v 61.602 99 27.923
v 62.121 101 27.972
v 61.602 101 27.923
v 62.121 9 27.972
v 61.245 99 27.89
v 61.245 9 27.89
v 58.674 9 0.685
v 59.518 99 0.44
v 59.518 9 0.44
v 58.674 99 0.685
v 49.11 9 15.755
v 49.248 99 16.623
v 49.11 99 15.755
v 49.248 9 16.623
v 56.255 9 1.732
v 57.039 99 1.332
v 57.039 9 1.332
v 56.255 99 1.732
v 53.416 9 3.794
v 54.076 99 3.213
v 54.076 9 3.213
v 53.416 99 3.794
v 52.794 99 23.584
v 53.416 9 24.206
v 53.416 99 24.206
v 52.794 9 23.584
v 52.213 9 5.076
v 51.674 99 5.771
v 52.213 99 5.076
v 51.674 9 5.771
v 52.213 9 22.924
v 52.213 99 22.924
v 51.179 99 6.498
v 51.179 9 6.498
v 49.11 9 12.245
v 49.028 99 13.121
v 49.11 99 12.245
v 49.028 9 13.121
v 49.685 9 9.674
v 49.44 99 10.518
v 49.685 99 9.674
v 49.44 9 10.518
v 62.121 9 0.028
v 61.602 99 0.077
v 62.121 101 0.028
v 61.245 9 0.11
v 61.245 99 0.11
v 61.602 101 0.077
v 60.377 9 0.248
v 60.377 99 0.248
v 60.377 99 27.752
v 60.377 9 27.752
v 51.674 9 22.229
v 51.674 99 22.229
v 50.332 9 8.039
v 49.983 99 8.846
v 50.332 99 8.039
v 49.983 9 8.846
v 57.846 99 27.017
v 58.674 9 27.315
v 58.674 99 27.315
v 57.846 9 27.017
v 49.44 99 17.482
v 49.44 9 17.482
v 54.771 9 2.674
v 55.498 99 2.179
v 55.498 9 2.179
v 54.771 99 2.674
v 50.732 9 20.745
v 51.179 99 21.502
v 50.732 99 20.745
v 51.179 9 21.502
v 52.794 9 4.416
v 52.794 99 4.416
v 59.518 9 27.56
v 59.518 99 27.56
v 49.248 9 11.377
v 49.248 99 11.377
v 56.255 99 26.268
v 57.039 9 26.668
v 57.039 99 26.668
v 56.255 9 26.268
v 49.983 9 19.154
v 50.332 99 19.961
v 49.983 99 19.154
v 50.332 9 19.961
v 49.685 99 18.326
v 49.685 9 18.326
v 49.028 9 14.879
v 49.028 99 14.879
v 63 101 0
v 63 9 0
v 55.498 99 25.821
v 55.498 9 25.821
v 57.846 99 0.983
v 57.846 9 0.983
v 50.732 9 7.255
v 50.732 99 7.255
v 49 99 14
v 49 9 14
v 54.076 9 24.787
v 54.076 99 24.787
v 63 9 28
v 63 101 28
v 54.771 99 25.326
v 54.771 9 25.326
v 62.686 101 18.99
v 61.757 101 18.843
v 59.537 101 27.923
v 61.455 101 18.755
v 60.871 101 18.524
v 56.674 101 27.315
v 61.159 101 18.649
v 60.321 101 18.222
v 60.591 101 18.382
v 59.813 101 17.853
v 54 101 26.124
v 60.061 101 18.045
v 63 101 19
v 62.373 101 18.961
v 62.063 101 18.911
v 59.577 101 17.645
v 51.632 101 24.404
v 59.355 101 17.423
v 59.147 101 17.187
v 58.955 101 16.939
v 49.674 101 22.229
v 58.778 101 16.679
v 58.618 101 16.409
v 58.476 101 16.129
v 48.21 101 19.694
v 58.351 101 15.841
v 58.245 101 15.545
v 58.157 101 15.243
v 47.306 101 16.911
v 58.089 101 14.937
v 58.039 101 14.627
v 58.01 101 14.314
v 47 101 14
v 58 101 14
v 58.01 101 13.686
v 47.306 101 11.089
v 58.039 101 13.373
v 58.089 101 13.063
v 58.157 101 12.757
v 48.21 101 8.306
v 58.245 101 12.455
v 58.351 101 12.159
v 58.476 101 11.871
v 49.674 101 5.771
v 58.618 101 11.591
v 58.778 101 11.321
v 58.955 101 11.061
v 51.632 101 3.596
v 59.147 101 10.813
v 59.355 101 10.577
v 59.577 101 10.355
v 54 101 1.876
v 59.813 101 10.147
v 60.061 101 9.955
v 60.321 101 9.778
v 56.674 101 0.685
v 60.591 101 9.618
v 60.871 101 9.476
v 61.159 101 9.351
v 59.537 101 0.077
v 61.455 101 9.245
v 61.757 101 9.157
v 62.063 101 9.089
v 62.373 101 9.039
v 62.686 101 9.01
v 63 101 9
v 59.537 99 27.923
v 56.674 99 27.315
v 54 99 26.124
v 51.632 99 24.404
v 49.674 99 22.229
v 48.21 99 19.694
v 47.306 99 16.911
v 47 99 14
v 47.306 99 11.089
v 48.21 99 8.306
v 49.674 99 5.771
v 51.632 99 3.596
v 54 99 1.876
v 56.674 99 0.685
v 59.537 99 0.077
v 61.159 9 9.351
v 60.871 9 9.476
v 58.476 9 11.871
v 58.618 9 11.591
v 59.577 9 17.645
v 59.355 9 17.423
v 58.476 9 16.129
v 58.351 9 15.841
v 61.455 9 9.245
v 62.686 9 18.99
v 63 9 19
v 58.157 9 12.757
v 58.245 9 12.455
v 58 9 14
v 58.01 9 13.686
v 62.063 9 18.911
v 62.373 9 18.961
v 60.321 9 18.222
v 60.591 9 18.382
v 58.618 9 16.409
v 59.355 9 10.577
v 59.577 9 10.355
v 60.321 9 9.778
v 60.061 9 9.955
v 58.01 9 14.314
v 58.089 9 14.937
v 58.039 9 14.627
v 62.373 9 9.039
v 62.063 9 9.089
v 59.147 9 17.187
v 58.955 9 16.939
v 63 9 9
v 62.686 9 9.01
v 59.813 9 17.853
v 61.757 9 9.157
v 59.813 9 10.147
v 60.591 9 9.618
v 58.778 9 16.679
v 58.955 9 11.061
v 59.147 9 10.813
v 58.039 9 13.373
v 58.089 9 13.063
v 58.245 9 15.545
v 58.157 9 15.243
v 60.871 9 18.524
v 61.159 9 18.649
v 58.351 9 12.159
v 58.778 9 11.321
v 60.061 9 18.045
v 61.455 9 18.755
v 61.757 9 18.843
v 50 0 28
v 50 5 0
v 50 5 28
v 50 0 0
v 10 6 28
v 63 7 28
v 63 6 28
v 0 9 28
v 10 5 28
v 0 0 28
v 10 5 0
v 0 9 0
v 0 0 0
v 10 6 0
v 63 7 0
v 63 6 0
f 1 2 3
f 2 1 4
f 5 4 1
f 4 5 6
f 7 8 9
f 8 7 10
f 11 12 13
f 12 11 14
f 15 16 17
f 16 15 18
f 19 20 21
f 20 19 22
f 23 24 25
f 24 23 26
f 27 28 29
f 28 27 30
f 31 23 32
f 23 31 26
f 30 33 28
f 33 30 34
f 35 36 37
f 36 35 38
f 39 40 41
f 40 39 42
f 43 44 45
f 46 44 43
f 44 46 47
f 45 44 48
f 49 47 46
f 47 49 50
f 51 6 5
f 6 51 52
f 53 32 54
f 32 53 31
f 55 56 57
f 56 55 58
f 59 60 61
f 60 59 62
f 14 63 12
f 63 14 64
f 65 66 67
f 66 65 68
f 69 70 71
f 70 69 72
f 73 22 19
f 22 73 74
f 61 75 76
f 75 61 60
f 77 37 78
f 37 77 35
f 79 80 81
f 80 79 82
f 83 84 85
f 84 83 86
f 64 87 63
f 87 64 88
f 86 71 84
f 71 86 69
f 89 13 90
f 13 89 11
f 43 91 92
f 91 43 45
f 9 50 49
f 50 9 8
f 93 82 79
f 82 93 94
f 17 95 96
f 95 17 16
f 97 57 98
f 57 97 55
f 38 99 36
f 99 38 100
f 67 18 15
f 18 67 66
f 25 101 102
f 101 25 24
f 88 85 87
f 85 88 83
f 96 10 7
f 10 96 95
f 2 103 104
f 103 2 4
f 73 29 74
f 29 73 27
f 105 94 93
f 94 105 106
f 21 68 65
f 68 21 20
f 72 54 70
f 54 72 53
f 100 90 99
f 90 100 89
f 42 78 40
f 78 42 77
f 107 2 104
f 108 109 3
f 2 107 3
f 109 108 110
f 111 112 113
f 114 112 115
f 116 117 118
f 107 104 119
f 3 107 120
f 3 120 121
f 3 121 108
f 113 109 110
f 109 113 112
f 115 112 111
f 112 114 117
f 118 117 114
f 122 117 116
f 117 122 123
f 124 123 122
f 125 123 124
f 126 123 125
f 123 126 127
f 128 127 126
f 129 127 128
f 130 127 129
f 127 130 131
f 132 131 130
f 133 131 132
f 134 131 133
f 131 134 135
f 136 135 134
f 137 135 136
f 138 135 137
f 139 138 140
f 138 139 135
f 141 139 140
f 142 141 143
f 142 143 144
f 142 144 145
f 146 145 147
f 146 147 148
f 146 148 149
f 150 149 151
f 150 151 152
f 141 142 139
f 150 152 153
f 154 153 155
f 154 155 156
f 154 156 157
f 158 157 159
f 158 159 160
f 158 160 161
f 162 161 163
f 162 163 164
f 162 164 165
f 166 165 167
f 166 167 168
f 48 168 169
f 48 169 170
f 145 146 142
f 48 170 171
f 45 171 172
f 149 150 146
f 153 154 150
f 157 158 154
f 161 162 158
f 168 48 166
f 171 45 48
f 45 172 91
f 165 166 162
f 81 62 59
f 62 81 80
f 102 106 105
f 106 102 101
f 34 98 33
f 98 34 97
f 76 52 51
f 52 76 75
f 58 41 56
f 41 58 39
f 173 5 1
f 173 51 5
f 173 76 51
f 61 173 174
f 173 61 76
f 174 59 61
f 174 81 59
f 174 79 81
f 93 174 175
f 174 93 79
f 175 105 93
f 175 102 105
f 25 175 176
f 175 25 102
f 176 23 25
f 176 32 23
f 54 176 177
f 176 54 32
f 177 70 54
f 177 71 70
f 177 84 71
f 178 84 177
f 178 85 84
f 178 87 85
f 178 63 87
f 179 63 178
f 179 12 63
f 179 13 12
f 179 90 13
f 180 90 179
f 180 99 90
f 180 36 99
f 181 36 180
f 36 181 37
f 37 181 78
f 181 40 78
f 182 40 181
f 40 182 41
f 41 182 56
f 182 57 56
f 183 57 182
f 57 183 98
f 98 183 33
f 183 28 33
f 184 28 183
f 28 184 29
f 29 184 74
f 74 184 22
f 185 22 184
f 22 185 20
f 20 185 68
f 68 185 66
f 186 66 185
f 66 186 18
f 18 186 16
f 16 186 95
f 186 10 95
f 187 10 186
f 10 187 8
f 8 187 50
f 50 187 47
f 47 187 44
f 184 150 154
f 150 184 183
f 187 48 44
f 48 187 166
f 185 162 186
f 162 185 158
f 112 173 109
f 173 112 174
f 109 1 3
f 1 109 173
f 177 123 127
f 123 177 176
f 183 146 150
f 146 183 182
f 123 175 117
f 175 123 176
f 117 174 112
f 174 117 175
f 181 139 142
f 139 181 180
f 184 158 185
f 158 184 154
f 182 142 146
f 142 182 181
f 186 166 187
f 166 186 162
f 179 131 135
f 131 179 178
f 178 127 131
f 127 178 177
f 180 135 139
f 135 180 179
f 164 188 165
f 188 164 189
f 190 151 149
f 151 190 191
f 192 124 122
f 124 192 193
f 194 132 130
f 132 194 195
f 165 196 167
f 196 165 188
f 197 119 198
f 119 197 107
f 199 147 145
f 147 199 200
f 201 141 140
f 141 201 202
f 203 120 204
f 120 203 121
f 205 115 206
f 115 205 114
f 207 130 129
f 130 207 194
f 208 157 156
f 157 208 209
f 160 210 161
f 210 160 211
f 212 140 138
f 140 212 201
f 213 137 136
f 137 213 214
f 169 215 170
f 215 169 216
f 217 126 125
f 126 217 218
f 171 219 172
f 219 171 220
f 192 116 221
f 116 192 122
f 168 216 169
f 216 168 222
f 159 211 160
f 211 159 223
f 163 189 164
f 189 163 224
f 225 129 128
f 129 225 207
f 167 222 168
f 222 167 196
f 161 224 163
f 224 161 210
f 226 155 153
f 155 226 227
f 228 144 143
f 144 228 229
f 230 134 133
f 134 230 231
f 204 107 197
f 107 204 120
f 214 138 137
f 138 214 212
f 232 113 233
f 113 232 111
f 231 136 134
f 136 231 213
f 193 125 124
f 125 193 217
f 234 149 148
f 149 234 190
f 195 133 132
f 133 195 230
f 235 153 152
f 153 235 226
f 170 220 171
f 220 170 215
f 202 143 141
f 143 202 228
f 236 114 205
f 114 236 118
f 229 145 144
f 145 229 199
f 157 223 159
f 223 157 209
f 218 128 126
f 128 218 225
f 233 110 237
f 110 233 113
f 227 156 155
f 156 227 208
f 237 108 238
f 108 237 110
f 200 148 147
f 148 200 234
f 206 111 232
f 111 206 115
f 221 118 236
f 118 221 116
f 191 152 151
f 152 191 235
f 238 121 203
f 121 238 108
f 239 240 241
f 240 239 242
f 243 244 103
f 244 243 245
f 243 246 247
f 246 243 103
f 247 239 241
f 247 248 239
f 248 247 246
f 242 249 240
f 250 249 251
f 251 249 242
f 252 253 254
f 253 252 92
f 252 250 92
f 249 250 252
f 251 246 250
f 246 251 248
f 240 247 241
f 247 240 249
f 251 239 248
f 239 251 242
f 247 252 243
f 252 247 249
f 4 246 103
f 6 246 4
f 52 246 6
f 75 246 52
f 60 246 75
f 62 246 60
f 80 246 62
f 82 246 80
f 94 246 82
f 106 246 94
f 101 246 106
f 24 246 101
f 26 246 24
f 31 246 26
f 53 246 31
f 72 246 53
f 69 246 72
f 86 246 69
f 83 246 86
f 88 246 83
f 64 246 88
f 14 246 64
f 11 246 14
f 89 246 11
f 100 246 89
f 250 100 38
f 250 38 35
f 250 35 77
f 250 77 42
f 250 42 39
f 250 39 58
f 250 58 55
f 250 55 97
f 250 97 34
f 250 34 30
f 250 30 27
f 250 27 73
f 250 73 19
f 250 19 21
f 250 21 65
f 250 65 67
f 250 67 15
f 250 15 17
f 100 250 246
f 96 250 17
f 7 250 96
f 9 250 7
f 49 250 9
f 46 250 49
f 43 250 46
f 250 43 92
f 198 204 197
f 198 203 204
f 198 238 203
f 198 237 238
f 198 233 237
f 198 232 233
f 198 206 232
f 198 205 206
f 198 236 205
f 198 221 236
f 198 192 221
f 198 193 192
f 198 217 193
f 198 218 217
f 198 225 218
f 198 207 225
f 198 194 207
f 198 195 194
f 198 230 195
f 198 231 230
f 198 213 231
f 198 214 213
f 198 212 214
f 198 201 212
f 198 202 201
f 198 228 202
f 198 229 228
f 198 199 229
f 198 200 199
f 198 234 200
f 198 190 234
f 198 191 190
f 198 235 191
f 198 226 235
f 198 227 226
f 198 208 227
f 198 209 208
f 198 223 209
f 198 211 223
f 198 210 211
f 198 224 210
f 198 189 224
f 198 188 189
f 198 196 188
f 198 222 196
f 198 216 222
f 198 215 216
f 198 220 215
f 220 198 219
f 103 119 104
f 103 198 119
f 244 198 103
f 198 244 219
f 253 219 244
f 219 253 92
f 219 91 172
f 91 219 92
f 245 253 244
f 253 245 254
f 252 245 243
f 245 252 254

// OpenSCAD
// diameter of the rod
d=28;
// length of the rod
l=90;

difference() {
	union() {
		cube([50,5,d]);
		cube([10,9,d]);
		translate([0,6,0]) {
			cube([63,3,d]);
		}
	    difference() {
		    union() {
				translate([63,8,d/2]) {
					rotate([-90,0,0]) {
						cylinder(r=d/2, h=l+1+2, $fn=100);
					}
				}
				translate([61,9+l,d/2]) {
					rotate([-90,0,0]) {
						cylinder(r=d/2, h=2);
					}
				}
			}
			translate([63,3,d/2]) {
				rotate([-90,0,0]) {
					cylinder(r=d/2-9, h=l+1+2+10, $fn=100);
				}
			}
		}
	}
	translate([63,7,-1]) {
		cube([d/2,l+9+2+10,d+2]);
	}
}
